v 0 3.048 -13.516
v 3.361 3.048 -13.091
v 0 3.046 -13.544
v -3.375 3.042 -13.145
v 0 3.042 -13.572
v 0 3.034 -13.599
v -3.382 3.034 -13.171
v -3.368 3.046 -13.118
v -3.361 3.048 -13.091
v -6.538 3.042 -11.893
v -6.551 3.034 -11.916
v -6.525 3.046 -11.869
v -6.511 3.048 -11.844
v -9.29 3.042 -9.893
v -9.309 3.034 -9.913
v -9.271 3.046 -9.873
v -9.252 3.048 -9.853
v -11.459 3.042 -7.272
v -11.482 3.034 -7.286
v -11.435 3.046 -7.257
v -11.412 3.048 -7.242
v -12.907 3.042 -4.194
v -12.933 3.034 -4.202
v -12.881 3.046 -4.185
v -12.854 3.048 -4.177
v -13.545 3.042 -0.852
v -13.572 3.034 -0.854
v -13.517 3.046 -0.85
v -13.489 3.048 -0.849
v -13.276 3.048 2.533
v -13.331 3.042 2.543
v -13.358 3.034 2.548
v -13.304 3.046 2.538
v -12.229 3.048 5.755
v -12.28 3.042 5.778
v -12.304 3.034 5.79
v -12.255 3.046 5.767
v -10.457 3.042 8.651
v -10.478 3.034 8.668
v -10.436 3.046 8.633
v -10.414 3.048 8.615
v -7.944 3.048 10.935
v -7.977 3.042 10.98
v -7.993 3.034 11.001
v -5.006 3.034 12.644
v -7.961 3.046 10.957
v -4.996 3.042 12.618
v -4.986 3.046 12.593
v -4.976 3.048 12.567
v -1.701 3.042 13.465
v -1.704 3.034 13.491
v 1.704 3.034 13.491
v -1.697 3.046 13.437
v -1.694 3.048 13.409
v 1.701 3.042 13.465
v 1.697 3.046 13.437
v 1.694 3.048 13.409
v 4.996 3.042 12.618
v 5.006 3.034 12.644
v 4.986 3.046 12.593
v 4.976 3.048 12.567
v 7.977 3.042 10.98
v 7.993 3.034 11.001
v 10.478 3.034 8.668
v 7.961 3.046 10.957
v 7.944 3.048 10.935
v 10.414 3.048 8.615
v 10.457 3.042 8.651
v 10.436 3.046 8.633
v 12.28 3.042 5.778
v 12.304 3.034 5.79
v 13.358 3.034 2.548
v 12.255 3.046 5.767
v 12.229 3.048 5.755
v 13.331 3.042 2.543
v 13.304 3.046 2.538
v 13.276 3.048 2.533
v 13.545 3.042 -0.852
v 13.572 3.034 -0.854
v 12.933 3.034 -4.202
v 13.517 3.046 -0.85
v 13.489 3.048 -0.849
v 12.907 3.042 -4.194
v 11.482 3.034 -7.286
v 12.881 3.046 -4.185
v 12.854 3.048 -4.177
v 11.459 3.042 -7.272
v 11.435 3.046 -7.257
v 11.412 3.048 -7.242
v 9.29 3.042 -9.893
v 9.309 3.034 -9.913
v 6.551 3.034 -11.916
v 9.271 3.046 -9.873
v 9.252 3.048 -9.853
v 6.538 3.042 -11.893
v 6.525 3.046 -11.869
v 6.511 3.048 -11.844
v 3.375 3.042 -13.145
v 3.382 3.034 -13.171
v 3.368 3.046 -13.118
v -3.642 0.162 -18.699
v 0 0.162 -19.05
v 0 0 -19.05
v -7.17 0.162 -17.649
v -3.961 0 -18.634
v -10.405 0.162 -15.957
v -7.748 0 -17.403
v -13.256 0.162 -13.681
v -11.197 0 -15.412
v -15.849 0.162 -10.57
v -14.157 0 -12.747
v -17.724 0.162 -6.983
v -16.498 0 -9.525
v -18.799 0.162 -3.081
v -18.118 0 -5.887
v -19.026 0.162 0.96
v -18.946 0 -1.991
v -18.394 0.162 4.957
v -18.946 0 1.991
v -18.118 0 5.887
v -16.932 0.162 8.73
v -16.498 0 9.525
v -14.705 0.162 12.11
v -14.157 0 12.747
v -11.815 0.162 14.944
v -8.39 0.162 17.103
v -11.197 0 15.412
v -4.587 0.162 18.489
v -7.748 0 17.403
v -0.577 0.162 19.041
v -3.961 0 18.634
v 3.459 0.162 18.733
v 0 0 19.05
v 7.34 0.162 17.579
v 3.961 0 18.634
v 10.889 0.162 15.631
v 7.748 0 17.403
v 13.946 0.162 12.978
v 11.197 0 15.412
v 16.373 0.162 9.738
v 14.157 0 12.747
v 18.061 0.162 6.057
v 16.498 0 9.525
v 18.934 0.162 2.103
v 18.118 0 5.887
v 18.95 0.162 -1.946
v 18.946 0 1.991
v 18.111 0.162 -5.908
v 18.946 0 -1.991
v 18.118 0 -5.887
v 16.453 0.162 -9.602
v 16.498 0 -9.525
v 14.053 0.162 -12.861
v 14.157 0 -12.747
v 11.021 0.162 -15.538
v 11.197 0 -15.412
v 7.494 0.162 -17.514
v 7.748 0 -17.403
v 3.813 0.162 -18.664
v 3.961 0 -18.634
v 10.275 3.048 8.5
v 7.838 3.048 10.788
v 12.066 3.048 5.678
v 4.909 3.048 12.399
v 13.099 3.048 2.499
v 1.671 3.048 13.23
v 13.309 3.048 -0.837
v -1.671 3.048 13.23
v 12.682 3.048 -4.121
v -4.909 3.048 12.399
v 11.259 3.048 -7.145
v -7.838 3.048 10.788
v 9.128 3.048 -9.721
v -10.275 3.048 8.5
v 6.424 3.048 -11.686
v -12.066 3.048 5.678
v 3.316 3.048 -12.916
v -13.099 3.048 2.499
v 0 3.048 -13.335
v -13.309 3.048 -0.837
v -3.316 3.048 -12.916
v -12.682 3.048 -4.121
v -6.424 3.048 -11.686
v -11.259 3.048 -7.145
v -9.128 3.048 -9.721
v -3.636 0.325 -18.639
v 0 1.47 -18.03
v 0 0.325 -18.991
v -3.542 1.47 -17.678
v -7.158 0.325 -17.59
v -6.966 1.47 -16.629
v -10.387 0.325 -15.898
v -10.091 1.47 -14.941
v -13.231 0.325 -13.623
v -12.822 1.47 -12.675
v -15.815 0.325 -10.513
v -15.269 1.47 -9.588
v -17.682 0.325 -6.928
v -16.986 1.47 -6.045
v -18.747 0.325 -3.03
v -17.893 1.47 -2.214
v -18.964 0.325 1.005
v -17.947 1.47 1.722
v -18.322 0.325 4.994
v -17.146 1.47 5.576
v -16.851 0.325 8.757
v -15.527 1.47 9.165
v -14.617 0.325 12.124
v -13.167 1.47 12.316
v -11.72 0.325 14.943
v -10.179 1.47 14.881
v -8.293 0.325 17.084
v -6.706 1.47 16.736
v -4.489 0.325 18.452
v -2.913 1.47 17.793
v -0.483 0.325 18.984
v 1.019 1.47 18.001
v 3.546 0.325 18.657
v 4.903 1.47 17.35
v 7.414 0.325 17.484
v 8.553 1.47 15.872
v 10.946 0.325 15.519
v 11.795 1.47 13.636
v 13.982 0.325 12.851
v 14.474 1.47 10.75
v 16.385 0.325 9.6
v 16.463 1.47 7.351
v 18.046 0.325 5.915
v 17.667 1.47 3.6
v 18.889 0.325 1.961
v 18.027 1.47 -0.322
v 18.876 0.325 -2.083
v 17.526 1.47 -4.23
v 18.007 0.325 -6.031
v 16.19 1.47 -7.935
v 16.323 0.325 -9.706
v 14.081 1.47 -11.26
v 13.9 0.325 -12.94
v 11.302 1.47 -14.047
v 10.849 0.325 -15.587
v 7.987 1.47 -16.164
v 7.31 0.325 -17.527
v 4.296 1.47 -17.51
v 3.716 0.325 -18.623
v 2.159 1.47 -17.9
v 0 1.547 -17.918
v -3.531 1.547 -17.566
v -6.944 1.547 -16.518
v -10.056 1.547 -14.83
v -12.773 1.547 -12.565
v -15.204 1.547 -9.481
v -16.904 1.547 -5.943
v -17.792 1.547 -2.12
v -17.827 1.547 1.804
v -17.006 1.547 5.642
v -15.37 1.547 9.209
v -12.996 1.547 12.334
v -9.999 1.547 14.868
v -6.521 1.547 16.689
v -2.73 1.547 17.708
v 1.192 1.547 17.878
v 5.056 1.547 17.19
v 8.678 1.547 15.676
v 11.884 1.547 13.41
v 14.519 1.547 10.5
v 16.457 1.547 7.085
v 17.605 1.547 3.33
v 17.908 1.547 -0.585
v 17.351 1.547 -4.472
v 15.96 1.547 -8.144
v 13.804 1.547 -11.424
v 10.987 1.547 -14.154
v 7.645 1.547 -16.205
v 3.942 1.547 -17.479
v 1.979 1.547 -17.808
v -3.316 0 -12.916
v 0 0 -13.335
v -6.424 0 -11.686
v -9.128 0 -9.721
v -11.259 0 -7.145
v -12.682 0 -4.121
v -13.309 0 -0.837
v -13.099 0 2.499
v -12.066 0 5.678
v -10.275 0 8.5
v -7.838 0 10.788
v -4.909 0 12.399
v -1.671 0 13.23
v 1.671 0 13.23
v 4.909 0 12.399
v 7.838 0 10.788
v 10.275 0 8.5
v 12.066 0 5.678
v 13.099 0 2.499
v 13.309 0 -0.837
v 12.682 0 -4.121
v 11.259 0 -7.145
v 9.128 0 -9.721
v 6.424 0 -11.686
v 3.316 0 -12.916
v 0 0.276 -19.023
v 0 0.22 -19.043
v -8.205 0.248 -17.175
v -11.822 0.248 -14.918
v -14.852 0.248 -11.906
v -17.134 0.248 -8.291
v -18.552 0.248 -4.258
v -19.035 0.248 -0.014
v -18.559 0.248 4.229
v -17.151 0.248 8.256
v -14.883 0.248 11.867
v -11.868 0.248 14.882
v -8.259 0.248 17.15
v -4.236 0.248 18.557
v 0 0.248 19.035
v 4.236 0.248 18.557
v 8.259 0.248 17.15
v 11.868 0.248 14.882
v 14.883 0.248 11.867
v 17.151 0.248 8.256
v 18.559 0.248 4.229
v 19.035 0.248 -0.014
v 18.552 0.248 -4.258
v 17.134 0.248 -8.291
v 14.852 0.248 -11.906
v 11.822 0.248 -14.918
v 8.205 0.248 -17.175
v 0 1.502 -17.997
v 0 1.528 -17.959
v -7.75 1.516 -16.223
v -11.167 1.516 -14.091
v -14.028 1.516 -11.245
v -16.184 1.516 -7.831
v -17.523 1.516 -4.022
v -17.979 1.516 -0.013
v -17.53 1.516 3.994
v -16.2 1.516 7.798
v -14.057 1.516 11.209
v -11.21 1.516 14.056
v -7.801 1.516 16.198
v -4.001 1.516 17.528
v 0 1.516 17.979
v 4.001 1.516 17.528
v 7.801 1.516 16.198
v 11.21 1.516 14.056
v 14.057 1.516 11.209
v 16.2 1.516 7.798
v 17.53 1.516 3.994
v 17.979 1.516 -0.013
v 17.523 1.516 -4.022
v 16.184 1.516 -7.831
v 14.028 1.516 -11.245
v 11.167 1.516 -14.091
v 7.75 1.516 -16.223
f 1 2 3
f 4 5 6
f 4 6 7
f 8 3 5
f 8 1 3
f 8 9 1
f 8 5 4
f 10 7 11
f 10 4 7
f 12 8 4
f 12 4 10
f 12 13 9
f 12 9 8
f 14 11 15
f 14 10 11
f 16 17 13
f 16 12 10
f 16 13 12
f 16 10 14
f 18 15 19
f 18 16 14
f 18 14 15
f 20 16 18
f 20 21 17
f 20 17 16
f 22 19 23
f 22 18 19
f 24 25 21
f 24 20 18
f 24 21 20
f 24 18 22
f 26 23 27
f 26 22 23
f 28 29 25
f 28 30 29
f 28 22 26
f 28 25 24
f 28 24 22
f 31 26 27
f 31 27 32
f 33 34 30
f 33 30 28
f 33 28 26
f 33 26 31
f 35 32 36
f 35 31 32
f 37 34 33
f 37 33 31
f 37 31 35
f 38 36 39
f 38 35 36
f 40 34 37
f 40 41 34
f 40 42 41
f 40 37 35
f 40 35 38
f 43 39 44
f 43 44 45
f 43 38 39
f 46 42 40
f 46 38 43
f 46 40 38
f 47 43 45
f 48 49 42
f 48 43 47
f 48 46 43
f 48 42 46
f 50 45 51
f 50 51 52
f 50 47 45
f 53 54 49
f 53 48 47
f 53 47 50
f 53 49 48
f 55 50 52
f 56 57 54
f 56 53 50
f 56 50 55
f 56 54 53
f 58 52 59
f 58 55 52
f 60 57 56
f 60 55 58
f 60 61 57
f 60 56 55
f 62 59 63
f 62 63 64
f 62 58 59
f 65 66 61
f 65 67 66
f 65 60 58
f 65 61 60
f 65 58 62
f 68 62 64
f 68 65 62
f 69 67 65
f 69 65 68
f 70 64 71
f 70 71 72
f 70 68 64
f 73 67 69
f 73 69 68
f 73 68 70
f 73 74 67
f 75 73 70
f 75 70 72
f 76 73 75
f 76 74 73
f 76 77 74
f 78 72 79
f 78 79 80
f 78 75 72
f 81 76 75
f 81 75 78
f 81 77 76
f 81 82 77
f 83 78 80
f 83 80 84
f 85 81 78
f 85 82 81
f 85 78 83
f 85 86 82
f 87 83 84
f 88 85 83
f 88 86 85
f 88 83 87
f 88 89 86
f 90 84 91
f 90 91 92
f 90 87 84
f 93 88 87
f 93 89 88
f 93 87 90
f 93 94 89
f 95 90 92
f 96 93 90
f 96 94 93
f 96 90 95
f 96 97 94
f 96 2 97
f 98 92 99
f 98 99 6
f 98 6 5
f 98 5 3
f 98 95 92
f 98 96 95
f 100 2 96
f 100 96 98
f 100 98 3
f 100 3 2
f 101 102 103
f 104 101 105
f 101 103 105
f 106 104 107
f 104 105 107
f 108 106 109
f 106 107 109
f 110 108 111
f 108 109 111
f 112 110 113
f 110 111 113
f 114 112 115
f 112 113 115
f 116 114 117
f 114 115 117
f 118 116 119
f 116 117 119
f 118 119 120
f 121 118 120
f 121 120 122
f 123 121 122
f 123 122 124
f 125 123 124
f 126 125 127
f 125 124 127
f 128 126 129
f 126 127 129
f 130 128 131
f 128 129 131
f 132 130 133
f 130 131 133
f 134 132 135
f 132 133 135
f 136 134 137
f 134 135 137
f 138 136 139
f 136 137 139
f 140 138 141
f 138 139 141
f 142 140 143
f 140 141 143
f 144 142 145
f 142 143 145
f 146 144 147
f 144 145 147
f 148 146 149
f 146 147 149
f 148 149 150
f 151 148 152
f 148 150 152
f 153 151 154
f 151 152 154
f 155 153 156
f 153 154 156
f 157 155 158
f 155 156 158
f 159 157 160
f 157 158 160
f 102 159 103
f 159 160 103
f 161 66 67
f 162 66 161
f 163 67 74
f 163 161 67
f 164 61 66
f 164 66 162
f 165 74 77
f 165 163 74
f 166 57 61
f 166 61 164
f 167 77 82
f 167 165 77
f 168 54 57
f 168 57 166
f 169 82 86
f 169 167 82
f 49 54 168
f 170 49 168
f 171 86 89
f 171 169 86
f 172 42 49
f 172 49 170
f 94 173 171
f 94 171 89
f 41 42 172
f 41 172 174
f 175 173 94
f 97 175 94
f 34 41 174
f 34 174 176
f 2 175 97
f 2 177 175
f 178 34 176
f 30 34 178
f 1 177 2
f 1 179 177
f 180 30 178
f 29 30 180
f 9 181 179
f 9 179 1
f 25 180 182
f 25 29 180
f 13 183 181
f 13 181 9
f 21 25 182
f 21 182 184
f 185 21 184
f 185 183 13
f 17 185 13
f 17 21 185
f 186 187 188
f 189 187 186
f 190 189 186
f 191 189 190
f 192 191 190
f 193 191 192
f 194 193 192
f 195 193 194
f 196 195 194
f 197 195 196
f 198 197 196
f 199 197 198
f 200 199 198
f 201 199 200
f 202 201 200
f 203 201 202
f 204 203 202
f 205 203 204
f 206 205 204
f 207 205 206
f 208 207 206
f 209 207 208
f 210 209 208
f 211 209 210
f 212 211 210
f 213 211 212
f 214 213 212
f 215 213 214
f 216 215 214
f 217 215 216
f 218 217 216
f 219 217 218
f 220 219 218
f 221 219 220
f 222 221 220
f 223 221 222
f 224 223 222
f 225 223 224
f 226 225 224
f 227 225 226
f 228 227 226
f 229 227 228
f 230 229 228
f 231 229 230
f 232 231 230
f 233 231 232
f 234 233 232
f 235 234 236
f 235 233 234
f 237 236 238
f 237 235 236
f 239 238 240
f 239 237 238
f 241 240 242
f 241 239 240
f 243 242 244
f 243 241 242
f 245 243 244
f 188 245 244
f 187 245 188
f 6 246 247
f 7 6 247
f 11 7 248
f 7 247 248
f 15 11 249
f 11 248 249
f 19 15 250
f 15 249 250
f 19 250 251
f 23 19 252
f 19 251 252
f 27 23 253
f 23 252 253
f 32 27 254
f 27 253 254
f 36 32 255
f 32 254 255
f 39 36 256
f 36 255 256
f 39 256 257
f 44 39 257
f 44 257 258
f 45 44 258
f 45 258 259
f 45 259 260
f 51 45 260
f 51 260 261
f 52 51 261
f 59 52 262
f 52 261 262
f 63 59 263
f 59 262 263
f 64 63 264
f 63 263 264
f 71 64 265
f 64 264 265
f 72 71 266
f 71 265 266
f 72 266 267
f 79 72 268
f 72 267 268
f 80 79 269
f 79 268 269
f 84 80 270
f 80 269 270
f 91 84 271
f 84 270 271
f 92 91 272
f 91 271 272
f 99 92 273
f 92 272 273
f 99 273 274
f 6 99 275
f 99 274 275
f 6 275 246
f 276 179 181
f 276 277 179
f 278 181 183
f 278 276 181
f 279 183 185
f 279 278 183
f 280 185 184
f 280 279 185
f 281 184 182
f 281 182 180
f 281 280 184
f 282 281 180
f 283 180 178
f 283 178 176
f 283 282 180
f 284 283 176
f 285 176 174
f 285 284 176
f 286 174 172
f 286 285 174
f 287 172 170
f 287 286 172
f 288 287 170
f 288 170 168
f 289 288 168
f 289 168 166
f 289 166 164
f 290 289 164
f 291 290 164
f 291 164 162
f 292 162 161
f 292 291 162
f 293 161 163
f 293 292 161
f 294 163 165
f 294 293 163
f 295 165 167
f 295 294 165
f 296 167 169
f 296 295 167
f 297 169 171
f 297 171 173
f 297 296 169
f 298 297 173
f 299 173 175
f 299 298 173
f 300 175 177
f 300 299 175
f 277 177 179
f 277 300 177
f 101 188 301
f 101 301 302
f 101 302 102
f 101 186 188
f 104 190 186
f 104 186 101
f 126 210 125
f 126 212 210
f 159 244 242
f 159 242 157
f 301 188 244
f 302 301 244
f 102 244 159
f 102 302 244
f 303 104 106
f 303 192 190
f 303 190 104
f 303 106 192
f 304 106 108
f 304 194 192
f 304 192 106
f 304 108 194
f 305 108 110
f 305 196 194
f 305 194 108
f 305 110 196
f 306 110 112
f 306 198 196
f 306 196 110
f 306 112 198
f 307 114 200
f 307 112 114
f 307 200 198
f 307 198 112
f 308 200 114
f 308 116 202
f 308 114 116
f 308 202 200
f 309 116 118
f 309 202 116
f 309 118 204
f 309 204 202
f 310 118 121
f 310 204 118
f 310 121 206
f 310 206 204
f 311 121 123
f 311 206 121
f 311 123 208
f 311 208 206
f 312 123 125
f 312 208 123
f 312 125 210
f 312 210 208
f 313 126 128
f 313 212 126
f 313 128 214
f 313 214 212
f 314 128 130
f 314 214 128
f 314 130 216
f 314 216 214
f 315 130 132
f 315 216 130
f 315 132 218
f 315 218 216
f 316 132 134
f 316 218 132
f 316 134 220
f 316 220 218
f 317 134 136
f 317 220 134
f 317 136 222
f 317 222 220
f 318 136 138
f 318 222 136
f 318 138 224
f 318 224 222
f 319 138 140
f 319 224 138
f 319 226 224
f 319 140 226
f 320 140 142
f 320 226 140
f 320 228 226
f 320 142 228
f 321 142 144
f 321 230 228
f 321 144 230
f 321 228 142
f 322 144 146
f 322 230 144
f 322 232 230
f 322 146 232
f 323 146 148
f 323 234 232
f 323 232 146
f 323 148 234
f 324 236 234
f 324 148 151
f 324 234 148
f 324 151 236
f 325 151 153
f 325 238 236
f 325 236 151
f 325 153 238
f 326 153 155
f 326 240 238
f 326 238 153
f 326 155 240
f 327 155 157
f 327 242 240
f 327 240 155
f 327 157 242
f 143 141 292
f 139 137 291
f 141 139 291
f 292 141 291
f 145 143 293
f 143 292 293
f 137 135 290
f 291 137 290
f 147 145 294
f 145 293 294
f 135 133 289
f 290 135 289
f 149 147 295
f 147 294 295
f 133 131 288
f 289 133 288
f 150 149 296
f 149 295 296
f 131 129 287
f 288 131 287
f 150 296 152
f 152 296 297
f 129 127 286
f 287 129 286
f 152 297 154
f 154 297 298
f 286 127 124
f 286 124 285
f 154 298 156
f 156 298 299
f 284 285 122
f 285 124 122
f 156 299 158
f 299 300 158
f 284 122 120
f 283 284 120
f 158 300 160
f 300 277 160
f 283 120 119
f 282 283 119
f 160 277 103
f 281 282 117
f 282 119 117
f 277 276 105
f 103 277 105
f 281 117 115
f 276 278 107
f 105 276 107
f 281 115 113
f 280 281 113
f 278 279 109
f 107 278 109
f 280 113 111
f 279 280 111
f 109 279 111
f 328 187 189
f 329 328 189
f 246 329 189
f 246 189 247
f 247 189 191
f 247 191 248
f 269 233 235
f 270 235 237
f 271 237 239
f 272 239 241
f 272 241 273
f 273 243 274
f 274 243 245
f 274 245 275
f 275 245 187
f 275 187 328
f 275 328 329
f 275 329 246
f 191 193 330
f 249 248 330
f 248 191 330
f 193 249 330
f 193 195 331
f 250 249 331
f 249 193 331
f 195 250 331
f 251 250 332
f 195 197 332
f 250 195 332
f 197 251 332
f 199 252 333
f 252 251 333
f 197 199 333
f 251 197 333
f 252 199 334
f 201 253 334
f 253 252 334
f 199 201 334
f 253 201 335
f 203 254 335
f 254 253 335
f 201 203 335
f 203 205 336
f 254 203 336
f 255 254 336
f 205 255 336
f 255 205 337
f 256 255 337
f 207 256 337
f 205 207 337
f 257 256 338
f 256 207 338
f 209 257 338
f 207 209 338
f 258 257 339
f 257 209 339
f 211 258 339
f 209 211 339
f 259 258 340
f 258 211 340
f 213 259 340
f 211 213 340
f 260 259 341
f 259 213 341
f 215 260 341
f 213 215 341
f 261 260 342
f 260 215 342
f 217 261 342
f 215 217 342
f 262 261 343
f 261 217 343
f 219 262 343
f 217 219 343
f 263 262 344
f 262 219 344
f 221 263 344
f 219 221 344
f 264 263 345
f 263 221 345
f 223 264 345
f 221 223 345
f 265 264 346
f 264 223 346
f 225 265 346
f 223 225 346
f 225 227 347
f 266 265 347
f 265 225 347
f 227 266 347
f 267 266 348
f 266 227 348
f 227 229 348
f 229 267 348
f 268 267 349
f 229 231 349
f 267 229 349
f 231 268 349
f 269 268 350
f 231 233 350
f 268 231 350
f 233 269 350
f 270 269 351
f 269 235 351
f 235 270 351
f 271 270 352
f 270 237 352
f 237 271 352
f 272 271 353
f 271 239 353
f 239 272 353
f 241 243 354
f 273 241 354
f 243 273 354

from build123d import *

# Parameters (mm, degrees)
SKETCH1_R       = 19.05
SKETCH1_R_2     = 13.335
EXTRUDE1_DEPTH  = 1.524
CHAMFER1_SIZE   = 1.27
CHAMFER1_SIZE2  = 1.065656532
SKETCH2_R       = 17.984343468
SKETCH2_R_2     = 13.335
EXTRUDE2_DEPTH  = 1.524
CHAMFER2_SIZE   = 4.426017378
CHAMFER2_SIZE_2 = 1.524
FILLET1_R       = 0.254


with BuildPart() as part:
    # Sketch1 → Extrude1 (new body)
    with BuildSketch(Plane(origin=(0, 0, 0), x_dir=(1, 0, 0), z_dir=(0, 1, 0))):
        with Locations(Location((0, 0, 0), (0, 0, 90))):
            Circle(SKETCH1_R)
        with Locations(Location((0, 0, 0), (0, 0, 90))):
            Circle(SKETCH1_R_2, mode=Mode.SUBTRACT)
    extrude(amount=EXTRUDE1_DEPTH)

    # Chamfer1
    chamfer1_edges = [part.edges().sort_by_distance(p)[0] for p in [
        (0, 1.524, 19.05),
    ]]
    chamfer1_side = [part.faces().sort_by_distance(p)[0] for p in [
        (0, 0.762, 19.05),
    ]]
    chamfer(chamfer1_edges, length=CHAMFER1_SIZE, length2=CHAMFER1_SIZE2, reference=chamfer1_side[0])

    # Sketch2 → Extrude2 (add)
    with BuildSketch(Plane(origin=(0, 1.524, 0), x_dir=(-1, 0, 0), z_dir=(0, 1, 0))):
        with Locations(Location((0, 0, 0), (0, 0, 270))):
            Circle(SKETCH2_R)
        with Locations(Location((0, 0, 0), (0, 0, 270))):
            Circle(SKETCH2_R_2, mode=Mode.SUBTRACT)
    extrude(amount=EXTRUDE2_DEPTH)

    # Chamfer2
    # the kernel refuses this chamfer: 4.426017378, 1.524 mm, written as the material it takes off along each edge
    with BuildSketch(Plane(origin=(0, 3.048, 0), x_dir=(0, 0, -1), z_dir=(1, 0, 0))) as chamfer2_piece_1:
        Polygon((17.984343468 - CHAMFER2_SIZE, 0), (17.984343468, -CHAMFER2_SIZE_2), (17.984343468, 0), align=None)
    revolve(axis=Axis((0, 3.048, 0), (0, 1, 0)), mode=Mode.SUBTRACT)

    # Fillet1
    fillet1_edges = [part.edges().sort_by_distance(p)[0] for p in [
        (0, 3.048, 13.55832609),
        (0, 1.524, 17.984343468),
        (0, 0.254, 19.05),
    ]]
    fillet(fillet1_edges, radius=FILLET1_R)


solid = part.part
